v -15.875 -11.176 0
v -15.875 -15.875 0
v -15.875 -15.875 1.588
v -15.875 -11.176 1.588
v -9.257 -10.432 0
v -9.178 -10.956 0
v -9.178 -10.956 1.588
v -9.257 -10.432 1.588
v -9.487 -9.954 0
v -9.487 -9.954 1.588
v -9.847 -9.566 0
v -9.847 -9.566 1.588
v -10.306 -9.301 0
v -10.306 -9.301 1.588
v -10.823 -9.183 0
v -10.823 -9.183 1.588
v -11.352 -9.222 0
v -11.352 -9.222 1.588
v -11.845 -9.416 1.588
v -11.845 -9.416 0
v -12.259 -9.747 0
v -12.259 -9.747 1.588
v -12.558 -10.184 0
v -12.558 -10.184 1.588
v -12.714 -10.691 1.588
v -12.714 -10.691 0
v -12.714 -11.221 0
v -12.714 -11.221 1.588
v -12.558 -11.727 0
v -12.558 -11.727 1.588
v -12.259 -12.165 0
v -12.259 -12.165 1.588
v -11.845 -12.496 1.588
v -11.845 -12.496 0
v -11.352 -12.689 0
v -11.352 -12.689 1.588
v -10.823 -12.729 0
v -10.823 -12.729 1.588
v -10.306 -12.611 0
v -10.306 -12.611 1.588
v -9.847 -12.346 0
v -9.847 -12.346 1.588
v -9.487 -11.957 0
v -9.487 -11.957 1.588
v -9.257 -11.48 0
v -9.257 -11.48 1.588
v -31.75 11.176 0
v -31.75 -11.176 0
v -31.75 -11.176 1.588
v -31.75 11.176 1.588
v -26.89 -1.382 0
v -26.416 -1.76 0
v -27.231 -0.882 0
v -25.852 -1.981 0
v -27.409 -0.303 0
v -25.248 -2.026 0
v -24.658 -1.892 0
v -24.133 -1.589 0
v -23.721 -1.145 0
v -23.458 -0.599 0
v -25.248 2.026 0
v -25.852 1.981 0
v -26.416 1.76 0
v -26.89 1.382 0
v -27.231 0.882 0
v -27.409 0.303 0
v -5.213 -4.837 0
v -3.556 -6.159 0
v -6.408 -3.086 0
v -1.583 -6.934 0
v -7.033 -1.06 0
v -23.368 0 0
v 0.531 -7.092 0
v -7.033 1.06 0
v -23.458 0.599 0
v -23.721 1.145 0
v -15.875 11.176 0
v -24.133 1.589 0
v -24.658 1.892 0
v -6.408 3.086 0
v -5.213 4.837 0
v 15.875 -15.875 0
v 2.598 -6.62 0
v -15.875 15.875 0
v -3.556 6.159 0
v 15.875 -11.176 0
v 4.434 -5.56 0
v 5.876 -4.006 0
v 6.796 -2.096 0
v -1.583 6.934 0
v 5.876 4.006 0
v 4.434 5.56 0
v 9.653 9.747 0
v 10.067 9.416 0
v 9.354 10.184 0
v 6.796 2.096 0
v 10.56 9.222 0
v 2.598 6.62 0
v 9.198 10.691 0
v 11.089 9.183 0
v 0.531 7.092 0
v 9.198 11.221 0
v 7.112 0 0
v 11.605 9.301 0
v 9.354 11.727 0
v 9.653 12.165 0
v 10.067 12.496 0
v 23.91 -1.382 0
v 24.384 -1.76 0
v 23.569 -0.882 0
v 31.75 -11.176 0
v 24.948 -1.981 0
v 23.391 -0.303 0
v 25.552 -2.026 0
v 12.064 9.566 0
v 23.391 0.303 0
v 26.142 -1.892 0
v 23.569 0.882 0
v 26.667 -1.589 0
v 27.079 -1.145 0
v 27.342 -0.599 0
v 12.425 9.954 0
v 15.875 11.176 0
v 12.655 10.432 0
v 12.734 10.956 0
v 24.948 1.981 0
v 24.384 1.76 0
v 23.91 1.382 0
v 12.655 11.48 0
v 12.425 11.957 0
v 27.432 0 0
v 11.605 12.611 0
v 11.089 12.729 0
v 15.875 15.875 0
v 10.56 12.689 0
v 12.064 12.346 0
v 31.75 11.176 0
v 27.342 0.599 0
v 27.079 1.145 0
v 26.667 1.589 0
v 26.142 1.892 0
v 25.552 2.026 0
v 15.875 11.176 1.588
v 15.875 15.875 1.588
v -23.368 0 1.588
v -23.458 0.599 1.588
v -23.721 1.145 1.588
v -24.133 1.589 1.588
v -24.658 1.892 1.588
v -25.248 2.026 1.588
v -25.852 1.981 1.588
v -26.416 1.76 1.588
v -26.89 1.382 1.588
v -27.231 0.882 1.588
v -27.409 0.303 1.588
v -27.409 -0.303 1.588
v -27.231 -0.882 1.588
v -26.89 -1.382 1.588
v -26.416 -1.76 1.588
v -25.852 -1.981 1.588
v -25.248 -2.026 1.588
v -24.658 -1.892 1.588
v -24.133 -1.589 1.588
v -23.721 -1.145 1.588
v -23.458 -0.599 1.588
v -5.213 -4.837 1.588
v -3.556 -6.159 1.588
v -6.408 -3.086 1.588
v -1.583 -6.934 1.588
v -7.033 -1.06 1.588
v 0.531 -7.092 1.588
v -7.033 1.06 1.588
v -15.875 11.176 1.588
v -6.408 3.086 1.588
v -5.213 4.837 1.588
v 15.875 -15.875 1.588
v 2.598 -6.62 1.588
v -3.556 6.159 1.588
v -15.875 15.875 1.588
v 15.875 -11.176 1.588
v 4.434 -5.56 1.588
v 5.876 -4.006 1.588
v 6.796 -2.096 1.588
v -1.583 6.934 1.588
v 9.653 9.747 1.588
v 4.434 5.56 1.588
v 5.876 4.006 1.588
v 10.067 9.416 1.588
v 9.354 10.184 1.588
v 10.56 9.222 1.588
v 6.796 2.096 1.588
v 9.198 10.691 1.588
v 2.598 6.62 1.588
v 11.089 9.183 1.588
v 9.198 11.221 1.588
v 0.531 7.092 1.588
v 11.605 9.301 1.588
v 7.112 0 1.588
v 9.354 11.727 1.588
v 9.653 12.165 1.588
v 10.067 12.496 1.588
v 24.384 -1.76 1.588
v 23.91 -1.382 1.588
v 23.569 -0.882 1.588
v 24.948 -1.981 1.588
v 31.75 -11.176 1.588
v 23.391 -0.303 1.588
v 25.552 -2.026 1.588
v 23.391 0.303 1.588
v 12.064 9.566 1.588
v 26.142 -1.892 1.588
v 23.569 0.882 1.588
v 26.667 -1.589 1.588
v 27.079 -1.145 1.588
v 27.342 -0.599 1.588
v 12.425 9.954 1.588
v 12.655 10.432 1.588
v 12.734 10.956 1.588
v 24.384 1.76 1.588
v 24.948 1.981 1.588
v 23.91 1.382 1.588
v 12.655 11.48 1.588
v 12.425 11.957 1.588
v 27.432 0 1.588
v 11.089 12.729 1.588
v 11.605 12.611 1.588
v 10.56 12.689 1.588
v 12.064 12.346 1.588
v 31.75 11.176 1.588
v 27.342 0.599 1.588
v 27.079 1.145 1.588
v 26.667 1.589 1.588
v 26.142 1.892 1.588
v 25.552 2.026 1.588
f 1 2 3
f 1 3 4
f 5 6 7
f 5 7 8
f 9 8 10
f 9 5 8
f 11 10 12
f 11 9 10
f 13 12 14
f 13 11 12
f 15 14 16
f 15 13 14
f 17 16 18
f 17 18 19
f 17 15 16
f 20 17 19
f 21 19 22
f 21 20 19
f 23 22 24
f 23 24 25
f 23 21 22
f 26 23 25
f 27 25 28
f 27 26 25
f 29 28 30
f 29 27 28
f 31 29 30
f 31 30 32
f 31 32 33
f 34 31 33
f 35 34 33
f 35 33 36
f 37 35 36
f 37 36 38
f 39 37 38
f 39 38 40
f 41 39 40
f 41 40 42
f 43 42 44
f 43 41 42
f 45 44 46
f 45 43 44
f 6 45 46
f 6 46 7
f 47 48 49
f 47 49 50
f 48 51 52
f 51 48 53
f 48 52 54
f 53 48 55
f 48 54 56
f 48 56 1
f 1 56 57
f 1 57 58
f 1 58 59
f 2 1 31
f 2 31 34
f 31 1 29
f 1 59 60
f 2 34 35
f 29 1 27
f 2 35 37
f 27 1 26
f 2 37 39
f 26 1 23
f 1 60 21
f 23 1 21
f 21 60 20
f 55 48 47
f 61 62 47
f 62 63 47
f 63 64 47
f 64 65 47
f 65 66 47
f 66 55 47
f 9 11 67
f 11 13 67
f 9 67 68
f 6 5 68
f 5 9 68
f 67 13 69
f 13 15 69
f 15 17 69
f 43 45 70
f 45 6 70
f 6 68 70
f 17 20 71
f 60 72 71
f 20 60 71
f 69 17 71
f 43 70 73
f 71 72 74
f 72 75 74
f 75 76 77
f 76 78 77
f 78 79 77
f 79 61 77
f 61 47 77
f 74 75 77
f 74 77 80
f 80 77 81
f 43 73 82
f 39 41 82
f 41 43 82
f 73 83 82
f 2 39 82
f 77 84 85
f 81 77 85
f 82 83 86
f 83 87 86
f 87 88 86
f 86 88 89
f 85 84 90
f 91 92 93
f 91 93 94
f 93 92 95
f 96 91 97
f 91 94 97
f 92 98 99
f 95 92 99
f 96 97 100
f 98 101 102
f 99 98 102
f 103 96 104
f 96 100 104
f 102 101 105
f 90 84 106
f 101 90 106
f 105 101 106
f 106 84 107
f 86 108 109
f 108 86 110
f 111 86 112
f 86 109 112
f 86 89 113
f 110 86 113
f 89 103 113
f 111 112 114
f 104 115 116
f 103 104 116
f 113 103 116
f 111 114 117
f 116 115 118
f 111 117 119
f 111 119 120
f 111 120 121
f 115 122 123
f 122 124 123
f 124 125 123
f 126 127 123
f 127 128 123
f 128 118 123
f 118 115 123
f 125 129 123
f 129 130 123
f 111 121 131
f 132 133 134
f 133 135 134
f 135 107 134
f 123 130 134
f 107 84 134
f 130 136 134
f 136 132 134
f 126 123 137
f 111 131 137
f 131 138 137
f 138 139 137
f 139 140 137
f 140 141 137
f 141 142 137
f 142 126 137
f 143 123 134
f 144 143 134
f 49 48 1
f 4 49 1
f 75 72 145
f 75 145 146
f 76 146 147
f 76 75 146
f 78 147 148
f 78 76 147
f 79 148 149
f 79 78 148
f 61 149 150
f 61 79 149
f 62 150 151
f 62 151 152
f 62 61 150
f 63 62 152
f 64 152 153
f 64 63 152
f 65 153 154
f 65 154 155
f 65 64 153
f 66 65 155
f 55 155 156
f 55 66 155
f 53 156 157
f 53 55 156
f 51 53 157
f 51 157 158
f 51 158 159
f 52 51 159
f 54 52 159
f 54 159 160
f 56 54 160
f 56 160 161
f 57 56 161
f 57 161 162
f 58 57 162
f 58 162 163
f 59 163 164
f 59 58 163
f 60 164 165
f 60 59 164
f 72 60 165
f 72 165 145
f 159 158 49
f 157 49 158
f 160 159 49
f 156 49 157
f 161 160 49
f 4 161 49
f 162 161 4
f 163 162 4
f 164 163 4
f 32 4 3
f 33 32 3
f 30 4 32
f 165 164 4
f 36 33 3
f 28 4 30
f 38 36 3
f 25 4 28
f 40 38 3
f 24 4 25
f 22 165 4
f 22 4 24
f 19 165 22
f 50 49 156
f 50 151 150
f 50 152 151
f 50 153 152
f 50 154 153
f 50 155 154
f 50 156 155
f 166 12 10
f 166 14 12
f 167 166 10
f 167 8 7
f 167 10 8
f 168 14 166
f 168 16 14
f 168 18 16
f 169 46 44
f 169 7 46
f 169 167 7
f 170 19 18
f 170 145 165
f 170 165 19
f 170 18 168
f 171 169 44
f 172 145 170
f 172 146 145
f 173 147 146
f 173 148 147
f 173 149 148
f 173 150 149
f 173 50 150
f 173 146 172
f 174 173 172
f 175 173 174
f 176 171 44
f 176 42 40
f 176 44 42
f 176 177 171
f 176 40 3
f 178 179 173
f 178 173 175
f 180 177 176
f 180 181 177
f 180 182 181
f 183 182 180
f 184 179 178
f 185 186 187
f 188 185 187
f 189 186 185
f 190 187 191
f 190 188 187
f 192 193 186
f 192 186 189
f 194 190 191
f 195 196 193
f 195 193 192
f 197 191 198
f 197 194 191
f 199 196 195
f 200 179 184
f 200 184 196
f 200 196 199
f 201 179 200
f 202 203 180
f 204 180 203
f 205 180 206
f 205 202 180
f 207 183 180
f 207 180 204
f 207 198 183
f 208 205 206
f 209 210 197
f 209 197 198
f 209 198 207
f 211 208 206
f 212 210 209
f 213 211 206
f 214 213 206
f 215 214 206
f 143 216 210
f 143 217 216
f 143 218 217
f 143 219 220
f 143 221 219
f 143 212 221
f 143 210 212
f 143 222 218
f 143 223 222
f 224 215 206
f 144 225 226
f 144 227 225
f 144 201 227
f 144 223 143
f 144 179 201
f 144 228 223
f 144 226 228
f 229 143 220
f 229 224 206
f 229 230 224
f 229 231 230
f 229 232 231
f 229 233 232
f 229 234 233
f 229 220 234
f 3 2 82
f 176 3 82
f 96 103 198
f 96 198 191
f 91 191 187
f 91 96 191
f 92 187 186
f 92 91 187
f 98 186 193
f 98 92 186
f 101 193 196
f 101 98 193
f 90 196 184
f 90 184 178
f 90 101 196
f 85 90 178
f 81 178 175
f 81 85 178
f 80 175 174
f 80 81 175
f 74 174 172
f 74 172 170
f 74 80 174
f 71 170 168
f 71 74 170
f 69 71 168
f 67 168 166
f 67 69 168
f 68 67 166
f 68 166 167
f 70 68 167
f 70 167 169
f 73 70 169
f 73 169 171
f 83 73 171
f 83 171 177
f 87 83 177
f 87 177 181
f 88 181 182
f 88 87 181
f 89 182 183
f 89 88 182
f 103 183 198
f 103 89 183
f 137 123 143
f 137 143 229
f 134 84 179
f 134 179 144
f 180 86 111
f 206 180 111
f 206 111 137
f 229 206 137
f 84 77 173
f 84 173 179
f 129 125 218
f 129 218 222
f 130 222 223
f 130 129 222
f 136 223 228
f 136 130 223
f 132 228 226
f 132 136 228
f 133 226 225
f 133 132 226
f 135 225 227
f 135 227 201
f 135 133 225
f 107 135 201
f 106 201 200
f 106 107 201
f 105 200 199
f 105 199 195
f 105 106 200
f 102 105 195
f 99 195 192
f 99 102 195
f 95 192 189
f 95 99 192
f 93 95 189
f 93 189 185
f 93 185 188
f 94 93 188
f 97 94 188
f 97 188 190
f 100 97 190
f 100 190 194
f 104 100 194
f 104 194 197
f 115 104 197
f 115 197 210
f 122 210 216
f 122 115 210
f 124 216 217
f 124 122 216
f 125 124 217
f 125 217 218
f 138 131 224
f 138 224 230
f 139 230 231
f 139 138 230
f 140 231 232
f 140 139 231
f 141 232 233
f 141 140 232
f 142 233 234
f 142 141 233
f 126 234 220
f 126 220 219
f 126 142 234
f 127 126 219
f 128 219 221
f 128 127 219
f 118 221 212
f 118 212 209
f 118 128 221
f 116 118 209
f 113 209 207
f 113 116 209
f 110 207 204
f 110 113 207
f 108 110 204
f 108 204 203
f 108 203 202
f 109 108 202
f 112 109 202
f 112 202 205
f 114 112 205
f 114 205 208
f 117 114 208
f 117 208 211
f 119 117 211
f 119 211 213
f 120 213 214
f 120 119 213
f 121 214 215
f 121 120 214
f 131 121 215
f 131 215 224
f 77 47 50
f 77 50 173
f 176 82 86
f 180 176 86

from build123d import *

# Parameters (mm, degrees)
SKETCH1_W           = 15.875
SKETCH1_H           = 22.352
SKETCH1_R           = 2.032
SKETCH1_W_2         = 31.75
SKETCH1_H_2         = 31.75
SKETCH1_R_2         = 7.112
SKETCH1_R_3         = 1.778
BOSS_EXTRUDE1_DEPTH = 1.5875


with BuildPart() as part:
    # Sketch1 → Boss-Extrude1 (new body)
    with BuildSketch(Plane.XY):
        with Locations((-23.8125, 0)):
            Rectangle(SKETCH1_W, SKETCH1_H)
        with Locations((-25.4, 0)):
            Circle(SKETCH1_R, mode=Mode.SUBTRACT)
        Rectangle(SKETCH1_W_2, SKETCH1_H_2)
        Circle(SKETCH1_R_2, mode=Mode.SUBTRACT)
        with Locations((-10.955912468, -10.955912468)):
            Circle(SKETCH1_R_3, mode=Mode.SUBTRACT)
        with Locations((10.955912468, 10.955912468)):
            Circle(SKETCH1_R_3, mode=Mode.SUBTRACT)
        with Locations((23.8125, 0)):
            Rectangle(SKETCH1_W, SKETCH1_H)
        with Locations((25.4, 0)):
            Circle(SKETCH1_R, mode=Mode.SUBTRACT)
    extrude(amount=BOSS_EXTRUDE1_DEPTH)


solid = part.part
